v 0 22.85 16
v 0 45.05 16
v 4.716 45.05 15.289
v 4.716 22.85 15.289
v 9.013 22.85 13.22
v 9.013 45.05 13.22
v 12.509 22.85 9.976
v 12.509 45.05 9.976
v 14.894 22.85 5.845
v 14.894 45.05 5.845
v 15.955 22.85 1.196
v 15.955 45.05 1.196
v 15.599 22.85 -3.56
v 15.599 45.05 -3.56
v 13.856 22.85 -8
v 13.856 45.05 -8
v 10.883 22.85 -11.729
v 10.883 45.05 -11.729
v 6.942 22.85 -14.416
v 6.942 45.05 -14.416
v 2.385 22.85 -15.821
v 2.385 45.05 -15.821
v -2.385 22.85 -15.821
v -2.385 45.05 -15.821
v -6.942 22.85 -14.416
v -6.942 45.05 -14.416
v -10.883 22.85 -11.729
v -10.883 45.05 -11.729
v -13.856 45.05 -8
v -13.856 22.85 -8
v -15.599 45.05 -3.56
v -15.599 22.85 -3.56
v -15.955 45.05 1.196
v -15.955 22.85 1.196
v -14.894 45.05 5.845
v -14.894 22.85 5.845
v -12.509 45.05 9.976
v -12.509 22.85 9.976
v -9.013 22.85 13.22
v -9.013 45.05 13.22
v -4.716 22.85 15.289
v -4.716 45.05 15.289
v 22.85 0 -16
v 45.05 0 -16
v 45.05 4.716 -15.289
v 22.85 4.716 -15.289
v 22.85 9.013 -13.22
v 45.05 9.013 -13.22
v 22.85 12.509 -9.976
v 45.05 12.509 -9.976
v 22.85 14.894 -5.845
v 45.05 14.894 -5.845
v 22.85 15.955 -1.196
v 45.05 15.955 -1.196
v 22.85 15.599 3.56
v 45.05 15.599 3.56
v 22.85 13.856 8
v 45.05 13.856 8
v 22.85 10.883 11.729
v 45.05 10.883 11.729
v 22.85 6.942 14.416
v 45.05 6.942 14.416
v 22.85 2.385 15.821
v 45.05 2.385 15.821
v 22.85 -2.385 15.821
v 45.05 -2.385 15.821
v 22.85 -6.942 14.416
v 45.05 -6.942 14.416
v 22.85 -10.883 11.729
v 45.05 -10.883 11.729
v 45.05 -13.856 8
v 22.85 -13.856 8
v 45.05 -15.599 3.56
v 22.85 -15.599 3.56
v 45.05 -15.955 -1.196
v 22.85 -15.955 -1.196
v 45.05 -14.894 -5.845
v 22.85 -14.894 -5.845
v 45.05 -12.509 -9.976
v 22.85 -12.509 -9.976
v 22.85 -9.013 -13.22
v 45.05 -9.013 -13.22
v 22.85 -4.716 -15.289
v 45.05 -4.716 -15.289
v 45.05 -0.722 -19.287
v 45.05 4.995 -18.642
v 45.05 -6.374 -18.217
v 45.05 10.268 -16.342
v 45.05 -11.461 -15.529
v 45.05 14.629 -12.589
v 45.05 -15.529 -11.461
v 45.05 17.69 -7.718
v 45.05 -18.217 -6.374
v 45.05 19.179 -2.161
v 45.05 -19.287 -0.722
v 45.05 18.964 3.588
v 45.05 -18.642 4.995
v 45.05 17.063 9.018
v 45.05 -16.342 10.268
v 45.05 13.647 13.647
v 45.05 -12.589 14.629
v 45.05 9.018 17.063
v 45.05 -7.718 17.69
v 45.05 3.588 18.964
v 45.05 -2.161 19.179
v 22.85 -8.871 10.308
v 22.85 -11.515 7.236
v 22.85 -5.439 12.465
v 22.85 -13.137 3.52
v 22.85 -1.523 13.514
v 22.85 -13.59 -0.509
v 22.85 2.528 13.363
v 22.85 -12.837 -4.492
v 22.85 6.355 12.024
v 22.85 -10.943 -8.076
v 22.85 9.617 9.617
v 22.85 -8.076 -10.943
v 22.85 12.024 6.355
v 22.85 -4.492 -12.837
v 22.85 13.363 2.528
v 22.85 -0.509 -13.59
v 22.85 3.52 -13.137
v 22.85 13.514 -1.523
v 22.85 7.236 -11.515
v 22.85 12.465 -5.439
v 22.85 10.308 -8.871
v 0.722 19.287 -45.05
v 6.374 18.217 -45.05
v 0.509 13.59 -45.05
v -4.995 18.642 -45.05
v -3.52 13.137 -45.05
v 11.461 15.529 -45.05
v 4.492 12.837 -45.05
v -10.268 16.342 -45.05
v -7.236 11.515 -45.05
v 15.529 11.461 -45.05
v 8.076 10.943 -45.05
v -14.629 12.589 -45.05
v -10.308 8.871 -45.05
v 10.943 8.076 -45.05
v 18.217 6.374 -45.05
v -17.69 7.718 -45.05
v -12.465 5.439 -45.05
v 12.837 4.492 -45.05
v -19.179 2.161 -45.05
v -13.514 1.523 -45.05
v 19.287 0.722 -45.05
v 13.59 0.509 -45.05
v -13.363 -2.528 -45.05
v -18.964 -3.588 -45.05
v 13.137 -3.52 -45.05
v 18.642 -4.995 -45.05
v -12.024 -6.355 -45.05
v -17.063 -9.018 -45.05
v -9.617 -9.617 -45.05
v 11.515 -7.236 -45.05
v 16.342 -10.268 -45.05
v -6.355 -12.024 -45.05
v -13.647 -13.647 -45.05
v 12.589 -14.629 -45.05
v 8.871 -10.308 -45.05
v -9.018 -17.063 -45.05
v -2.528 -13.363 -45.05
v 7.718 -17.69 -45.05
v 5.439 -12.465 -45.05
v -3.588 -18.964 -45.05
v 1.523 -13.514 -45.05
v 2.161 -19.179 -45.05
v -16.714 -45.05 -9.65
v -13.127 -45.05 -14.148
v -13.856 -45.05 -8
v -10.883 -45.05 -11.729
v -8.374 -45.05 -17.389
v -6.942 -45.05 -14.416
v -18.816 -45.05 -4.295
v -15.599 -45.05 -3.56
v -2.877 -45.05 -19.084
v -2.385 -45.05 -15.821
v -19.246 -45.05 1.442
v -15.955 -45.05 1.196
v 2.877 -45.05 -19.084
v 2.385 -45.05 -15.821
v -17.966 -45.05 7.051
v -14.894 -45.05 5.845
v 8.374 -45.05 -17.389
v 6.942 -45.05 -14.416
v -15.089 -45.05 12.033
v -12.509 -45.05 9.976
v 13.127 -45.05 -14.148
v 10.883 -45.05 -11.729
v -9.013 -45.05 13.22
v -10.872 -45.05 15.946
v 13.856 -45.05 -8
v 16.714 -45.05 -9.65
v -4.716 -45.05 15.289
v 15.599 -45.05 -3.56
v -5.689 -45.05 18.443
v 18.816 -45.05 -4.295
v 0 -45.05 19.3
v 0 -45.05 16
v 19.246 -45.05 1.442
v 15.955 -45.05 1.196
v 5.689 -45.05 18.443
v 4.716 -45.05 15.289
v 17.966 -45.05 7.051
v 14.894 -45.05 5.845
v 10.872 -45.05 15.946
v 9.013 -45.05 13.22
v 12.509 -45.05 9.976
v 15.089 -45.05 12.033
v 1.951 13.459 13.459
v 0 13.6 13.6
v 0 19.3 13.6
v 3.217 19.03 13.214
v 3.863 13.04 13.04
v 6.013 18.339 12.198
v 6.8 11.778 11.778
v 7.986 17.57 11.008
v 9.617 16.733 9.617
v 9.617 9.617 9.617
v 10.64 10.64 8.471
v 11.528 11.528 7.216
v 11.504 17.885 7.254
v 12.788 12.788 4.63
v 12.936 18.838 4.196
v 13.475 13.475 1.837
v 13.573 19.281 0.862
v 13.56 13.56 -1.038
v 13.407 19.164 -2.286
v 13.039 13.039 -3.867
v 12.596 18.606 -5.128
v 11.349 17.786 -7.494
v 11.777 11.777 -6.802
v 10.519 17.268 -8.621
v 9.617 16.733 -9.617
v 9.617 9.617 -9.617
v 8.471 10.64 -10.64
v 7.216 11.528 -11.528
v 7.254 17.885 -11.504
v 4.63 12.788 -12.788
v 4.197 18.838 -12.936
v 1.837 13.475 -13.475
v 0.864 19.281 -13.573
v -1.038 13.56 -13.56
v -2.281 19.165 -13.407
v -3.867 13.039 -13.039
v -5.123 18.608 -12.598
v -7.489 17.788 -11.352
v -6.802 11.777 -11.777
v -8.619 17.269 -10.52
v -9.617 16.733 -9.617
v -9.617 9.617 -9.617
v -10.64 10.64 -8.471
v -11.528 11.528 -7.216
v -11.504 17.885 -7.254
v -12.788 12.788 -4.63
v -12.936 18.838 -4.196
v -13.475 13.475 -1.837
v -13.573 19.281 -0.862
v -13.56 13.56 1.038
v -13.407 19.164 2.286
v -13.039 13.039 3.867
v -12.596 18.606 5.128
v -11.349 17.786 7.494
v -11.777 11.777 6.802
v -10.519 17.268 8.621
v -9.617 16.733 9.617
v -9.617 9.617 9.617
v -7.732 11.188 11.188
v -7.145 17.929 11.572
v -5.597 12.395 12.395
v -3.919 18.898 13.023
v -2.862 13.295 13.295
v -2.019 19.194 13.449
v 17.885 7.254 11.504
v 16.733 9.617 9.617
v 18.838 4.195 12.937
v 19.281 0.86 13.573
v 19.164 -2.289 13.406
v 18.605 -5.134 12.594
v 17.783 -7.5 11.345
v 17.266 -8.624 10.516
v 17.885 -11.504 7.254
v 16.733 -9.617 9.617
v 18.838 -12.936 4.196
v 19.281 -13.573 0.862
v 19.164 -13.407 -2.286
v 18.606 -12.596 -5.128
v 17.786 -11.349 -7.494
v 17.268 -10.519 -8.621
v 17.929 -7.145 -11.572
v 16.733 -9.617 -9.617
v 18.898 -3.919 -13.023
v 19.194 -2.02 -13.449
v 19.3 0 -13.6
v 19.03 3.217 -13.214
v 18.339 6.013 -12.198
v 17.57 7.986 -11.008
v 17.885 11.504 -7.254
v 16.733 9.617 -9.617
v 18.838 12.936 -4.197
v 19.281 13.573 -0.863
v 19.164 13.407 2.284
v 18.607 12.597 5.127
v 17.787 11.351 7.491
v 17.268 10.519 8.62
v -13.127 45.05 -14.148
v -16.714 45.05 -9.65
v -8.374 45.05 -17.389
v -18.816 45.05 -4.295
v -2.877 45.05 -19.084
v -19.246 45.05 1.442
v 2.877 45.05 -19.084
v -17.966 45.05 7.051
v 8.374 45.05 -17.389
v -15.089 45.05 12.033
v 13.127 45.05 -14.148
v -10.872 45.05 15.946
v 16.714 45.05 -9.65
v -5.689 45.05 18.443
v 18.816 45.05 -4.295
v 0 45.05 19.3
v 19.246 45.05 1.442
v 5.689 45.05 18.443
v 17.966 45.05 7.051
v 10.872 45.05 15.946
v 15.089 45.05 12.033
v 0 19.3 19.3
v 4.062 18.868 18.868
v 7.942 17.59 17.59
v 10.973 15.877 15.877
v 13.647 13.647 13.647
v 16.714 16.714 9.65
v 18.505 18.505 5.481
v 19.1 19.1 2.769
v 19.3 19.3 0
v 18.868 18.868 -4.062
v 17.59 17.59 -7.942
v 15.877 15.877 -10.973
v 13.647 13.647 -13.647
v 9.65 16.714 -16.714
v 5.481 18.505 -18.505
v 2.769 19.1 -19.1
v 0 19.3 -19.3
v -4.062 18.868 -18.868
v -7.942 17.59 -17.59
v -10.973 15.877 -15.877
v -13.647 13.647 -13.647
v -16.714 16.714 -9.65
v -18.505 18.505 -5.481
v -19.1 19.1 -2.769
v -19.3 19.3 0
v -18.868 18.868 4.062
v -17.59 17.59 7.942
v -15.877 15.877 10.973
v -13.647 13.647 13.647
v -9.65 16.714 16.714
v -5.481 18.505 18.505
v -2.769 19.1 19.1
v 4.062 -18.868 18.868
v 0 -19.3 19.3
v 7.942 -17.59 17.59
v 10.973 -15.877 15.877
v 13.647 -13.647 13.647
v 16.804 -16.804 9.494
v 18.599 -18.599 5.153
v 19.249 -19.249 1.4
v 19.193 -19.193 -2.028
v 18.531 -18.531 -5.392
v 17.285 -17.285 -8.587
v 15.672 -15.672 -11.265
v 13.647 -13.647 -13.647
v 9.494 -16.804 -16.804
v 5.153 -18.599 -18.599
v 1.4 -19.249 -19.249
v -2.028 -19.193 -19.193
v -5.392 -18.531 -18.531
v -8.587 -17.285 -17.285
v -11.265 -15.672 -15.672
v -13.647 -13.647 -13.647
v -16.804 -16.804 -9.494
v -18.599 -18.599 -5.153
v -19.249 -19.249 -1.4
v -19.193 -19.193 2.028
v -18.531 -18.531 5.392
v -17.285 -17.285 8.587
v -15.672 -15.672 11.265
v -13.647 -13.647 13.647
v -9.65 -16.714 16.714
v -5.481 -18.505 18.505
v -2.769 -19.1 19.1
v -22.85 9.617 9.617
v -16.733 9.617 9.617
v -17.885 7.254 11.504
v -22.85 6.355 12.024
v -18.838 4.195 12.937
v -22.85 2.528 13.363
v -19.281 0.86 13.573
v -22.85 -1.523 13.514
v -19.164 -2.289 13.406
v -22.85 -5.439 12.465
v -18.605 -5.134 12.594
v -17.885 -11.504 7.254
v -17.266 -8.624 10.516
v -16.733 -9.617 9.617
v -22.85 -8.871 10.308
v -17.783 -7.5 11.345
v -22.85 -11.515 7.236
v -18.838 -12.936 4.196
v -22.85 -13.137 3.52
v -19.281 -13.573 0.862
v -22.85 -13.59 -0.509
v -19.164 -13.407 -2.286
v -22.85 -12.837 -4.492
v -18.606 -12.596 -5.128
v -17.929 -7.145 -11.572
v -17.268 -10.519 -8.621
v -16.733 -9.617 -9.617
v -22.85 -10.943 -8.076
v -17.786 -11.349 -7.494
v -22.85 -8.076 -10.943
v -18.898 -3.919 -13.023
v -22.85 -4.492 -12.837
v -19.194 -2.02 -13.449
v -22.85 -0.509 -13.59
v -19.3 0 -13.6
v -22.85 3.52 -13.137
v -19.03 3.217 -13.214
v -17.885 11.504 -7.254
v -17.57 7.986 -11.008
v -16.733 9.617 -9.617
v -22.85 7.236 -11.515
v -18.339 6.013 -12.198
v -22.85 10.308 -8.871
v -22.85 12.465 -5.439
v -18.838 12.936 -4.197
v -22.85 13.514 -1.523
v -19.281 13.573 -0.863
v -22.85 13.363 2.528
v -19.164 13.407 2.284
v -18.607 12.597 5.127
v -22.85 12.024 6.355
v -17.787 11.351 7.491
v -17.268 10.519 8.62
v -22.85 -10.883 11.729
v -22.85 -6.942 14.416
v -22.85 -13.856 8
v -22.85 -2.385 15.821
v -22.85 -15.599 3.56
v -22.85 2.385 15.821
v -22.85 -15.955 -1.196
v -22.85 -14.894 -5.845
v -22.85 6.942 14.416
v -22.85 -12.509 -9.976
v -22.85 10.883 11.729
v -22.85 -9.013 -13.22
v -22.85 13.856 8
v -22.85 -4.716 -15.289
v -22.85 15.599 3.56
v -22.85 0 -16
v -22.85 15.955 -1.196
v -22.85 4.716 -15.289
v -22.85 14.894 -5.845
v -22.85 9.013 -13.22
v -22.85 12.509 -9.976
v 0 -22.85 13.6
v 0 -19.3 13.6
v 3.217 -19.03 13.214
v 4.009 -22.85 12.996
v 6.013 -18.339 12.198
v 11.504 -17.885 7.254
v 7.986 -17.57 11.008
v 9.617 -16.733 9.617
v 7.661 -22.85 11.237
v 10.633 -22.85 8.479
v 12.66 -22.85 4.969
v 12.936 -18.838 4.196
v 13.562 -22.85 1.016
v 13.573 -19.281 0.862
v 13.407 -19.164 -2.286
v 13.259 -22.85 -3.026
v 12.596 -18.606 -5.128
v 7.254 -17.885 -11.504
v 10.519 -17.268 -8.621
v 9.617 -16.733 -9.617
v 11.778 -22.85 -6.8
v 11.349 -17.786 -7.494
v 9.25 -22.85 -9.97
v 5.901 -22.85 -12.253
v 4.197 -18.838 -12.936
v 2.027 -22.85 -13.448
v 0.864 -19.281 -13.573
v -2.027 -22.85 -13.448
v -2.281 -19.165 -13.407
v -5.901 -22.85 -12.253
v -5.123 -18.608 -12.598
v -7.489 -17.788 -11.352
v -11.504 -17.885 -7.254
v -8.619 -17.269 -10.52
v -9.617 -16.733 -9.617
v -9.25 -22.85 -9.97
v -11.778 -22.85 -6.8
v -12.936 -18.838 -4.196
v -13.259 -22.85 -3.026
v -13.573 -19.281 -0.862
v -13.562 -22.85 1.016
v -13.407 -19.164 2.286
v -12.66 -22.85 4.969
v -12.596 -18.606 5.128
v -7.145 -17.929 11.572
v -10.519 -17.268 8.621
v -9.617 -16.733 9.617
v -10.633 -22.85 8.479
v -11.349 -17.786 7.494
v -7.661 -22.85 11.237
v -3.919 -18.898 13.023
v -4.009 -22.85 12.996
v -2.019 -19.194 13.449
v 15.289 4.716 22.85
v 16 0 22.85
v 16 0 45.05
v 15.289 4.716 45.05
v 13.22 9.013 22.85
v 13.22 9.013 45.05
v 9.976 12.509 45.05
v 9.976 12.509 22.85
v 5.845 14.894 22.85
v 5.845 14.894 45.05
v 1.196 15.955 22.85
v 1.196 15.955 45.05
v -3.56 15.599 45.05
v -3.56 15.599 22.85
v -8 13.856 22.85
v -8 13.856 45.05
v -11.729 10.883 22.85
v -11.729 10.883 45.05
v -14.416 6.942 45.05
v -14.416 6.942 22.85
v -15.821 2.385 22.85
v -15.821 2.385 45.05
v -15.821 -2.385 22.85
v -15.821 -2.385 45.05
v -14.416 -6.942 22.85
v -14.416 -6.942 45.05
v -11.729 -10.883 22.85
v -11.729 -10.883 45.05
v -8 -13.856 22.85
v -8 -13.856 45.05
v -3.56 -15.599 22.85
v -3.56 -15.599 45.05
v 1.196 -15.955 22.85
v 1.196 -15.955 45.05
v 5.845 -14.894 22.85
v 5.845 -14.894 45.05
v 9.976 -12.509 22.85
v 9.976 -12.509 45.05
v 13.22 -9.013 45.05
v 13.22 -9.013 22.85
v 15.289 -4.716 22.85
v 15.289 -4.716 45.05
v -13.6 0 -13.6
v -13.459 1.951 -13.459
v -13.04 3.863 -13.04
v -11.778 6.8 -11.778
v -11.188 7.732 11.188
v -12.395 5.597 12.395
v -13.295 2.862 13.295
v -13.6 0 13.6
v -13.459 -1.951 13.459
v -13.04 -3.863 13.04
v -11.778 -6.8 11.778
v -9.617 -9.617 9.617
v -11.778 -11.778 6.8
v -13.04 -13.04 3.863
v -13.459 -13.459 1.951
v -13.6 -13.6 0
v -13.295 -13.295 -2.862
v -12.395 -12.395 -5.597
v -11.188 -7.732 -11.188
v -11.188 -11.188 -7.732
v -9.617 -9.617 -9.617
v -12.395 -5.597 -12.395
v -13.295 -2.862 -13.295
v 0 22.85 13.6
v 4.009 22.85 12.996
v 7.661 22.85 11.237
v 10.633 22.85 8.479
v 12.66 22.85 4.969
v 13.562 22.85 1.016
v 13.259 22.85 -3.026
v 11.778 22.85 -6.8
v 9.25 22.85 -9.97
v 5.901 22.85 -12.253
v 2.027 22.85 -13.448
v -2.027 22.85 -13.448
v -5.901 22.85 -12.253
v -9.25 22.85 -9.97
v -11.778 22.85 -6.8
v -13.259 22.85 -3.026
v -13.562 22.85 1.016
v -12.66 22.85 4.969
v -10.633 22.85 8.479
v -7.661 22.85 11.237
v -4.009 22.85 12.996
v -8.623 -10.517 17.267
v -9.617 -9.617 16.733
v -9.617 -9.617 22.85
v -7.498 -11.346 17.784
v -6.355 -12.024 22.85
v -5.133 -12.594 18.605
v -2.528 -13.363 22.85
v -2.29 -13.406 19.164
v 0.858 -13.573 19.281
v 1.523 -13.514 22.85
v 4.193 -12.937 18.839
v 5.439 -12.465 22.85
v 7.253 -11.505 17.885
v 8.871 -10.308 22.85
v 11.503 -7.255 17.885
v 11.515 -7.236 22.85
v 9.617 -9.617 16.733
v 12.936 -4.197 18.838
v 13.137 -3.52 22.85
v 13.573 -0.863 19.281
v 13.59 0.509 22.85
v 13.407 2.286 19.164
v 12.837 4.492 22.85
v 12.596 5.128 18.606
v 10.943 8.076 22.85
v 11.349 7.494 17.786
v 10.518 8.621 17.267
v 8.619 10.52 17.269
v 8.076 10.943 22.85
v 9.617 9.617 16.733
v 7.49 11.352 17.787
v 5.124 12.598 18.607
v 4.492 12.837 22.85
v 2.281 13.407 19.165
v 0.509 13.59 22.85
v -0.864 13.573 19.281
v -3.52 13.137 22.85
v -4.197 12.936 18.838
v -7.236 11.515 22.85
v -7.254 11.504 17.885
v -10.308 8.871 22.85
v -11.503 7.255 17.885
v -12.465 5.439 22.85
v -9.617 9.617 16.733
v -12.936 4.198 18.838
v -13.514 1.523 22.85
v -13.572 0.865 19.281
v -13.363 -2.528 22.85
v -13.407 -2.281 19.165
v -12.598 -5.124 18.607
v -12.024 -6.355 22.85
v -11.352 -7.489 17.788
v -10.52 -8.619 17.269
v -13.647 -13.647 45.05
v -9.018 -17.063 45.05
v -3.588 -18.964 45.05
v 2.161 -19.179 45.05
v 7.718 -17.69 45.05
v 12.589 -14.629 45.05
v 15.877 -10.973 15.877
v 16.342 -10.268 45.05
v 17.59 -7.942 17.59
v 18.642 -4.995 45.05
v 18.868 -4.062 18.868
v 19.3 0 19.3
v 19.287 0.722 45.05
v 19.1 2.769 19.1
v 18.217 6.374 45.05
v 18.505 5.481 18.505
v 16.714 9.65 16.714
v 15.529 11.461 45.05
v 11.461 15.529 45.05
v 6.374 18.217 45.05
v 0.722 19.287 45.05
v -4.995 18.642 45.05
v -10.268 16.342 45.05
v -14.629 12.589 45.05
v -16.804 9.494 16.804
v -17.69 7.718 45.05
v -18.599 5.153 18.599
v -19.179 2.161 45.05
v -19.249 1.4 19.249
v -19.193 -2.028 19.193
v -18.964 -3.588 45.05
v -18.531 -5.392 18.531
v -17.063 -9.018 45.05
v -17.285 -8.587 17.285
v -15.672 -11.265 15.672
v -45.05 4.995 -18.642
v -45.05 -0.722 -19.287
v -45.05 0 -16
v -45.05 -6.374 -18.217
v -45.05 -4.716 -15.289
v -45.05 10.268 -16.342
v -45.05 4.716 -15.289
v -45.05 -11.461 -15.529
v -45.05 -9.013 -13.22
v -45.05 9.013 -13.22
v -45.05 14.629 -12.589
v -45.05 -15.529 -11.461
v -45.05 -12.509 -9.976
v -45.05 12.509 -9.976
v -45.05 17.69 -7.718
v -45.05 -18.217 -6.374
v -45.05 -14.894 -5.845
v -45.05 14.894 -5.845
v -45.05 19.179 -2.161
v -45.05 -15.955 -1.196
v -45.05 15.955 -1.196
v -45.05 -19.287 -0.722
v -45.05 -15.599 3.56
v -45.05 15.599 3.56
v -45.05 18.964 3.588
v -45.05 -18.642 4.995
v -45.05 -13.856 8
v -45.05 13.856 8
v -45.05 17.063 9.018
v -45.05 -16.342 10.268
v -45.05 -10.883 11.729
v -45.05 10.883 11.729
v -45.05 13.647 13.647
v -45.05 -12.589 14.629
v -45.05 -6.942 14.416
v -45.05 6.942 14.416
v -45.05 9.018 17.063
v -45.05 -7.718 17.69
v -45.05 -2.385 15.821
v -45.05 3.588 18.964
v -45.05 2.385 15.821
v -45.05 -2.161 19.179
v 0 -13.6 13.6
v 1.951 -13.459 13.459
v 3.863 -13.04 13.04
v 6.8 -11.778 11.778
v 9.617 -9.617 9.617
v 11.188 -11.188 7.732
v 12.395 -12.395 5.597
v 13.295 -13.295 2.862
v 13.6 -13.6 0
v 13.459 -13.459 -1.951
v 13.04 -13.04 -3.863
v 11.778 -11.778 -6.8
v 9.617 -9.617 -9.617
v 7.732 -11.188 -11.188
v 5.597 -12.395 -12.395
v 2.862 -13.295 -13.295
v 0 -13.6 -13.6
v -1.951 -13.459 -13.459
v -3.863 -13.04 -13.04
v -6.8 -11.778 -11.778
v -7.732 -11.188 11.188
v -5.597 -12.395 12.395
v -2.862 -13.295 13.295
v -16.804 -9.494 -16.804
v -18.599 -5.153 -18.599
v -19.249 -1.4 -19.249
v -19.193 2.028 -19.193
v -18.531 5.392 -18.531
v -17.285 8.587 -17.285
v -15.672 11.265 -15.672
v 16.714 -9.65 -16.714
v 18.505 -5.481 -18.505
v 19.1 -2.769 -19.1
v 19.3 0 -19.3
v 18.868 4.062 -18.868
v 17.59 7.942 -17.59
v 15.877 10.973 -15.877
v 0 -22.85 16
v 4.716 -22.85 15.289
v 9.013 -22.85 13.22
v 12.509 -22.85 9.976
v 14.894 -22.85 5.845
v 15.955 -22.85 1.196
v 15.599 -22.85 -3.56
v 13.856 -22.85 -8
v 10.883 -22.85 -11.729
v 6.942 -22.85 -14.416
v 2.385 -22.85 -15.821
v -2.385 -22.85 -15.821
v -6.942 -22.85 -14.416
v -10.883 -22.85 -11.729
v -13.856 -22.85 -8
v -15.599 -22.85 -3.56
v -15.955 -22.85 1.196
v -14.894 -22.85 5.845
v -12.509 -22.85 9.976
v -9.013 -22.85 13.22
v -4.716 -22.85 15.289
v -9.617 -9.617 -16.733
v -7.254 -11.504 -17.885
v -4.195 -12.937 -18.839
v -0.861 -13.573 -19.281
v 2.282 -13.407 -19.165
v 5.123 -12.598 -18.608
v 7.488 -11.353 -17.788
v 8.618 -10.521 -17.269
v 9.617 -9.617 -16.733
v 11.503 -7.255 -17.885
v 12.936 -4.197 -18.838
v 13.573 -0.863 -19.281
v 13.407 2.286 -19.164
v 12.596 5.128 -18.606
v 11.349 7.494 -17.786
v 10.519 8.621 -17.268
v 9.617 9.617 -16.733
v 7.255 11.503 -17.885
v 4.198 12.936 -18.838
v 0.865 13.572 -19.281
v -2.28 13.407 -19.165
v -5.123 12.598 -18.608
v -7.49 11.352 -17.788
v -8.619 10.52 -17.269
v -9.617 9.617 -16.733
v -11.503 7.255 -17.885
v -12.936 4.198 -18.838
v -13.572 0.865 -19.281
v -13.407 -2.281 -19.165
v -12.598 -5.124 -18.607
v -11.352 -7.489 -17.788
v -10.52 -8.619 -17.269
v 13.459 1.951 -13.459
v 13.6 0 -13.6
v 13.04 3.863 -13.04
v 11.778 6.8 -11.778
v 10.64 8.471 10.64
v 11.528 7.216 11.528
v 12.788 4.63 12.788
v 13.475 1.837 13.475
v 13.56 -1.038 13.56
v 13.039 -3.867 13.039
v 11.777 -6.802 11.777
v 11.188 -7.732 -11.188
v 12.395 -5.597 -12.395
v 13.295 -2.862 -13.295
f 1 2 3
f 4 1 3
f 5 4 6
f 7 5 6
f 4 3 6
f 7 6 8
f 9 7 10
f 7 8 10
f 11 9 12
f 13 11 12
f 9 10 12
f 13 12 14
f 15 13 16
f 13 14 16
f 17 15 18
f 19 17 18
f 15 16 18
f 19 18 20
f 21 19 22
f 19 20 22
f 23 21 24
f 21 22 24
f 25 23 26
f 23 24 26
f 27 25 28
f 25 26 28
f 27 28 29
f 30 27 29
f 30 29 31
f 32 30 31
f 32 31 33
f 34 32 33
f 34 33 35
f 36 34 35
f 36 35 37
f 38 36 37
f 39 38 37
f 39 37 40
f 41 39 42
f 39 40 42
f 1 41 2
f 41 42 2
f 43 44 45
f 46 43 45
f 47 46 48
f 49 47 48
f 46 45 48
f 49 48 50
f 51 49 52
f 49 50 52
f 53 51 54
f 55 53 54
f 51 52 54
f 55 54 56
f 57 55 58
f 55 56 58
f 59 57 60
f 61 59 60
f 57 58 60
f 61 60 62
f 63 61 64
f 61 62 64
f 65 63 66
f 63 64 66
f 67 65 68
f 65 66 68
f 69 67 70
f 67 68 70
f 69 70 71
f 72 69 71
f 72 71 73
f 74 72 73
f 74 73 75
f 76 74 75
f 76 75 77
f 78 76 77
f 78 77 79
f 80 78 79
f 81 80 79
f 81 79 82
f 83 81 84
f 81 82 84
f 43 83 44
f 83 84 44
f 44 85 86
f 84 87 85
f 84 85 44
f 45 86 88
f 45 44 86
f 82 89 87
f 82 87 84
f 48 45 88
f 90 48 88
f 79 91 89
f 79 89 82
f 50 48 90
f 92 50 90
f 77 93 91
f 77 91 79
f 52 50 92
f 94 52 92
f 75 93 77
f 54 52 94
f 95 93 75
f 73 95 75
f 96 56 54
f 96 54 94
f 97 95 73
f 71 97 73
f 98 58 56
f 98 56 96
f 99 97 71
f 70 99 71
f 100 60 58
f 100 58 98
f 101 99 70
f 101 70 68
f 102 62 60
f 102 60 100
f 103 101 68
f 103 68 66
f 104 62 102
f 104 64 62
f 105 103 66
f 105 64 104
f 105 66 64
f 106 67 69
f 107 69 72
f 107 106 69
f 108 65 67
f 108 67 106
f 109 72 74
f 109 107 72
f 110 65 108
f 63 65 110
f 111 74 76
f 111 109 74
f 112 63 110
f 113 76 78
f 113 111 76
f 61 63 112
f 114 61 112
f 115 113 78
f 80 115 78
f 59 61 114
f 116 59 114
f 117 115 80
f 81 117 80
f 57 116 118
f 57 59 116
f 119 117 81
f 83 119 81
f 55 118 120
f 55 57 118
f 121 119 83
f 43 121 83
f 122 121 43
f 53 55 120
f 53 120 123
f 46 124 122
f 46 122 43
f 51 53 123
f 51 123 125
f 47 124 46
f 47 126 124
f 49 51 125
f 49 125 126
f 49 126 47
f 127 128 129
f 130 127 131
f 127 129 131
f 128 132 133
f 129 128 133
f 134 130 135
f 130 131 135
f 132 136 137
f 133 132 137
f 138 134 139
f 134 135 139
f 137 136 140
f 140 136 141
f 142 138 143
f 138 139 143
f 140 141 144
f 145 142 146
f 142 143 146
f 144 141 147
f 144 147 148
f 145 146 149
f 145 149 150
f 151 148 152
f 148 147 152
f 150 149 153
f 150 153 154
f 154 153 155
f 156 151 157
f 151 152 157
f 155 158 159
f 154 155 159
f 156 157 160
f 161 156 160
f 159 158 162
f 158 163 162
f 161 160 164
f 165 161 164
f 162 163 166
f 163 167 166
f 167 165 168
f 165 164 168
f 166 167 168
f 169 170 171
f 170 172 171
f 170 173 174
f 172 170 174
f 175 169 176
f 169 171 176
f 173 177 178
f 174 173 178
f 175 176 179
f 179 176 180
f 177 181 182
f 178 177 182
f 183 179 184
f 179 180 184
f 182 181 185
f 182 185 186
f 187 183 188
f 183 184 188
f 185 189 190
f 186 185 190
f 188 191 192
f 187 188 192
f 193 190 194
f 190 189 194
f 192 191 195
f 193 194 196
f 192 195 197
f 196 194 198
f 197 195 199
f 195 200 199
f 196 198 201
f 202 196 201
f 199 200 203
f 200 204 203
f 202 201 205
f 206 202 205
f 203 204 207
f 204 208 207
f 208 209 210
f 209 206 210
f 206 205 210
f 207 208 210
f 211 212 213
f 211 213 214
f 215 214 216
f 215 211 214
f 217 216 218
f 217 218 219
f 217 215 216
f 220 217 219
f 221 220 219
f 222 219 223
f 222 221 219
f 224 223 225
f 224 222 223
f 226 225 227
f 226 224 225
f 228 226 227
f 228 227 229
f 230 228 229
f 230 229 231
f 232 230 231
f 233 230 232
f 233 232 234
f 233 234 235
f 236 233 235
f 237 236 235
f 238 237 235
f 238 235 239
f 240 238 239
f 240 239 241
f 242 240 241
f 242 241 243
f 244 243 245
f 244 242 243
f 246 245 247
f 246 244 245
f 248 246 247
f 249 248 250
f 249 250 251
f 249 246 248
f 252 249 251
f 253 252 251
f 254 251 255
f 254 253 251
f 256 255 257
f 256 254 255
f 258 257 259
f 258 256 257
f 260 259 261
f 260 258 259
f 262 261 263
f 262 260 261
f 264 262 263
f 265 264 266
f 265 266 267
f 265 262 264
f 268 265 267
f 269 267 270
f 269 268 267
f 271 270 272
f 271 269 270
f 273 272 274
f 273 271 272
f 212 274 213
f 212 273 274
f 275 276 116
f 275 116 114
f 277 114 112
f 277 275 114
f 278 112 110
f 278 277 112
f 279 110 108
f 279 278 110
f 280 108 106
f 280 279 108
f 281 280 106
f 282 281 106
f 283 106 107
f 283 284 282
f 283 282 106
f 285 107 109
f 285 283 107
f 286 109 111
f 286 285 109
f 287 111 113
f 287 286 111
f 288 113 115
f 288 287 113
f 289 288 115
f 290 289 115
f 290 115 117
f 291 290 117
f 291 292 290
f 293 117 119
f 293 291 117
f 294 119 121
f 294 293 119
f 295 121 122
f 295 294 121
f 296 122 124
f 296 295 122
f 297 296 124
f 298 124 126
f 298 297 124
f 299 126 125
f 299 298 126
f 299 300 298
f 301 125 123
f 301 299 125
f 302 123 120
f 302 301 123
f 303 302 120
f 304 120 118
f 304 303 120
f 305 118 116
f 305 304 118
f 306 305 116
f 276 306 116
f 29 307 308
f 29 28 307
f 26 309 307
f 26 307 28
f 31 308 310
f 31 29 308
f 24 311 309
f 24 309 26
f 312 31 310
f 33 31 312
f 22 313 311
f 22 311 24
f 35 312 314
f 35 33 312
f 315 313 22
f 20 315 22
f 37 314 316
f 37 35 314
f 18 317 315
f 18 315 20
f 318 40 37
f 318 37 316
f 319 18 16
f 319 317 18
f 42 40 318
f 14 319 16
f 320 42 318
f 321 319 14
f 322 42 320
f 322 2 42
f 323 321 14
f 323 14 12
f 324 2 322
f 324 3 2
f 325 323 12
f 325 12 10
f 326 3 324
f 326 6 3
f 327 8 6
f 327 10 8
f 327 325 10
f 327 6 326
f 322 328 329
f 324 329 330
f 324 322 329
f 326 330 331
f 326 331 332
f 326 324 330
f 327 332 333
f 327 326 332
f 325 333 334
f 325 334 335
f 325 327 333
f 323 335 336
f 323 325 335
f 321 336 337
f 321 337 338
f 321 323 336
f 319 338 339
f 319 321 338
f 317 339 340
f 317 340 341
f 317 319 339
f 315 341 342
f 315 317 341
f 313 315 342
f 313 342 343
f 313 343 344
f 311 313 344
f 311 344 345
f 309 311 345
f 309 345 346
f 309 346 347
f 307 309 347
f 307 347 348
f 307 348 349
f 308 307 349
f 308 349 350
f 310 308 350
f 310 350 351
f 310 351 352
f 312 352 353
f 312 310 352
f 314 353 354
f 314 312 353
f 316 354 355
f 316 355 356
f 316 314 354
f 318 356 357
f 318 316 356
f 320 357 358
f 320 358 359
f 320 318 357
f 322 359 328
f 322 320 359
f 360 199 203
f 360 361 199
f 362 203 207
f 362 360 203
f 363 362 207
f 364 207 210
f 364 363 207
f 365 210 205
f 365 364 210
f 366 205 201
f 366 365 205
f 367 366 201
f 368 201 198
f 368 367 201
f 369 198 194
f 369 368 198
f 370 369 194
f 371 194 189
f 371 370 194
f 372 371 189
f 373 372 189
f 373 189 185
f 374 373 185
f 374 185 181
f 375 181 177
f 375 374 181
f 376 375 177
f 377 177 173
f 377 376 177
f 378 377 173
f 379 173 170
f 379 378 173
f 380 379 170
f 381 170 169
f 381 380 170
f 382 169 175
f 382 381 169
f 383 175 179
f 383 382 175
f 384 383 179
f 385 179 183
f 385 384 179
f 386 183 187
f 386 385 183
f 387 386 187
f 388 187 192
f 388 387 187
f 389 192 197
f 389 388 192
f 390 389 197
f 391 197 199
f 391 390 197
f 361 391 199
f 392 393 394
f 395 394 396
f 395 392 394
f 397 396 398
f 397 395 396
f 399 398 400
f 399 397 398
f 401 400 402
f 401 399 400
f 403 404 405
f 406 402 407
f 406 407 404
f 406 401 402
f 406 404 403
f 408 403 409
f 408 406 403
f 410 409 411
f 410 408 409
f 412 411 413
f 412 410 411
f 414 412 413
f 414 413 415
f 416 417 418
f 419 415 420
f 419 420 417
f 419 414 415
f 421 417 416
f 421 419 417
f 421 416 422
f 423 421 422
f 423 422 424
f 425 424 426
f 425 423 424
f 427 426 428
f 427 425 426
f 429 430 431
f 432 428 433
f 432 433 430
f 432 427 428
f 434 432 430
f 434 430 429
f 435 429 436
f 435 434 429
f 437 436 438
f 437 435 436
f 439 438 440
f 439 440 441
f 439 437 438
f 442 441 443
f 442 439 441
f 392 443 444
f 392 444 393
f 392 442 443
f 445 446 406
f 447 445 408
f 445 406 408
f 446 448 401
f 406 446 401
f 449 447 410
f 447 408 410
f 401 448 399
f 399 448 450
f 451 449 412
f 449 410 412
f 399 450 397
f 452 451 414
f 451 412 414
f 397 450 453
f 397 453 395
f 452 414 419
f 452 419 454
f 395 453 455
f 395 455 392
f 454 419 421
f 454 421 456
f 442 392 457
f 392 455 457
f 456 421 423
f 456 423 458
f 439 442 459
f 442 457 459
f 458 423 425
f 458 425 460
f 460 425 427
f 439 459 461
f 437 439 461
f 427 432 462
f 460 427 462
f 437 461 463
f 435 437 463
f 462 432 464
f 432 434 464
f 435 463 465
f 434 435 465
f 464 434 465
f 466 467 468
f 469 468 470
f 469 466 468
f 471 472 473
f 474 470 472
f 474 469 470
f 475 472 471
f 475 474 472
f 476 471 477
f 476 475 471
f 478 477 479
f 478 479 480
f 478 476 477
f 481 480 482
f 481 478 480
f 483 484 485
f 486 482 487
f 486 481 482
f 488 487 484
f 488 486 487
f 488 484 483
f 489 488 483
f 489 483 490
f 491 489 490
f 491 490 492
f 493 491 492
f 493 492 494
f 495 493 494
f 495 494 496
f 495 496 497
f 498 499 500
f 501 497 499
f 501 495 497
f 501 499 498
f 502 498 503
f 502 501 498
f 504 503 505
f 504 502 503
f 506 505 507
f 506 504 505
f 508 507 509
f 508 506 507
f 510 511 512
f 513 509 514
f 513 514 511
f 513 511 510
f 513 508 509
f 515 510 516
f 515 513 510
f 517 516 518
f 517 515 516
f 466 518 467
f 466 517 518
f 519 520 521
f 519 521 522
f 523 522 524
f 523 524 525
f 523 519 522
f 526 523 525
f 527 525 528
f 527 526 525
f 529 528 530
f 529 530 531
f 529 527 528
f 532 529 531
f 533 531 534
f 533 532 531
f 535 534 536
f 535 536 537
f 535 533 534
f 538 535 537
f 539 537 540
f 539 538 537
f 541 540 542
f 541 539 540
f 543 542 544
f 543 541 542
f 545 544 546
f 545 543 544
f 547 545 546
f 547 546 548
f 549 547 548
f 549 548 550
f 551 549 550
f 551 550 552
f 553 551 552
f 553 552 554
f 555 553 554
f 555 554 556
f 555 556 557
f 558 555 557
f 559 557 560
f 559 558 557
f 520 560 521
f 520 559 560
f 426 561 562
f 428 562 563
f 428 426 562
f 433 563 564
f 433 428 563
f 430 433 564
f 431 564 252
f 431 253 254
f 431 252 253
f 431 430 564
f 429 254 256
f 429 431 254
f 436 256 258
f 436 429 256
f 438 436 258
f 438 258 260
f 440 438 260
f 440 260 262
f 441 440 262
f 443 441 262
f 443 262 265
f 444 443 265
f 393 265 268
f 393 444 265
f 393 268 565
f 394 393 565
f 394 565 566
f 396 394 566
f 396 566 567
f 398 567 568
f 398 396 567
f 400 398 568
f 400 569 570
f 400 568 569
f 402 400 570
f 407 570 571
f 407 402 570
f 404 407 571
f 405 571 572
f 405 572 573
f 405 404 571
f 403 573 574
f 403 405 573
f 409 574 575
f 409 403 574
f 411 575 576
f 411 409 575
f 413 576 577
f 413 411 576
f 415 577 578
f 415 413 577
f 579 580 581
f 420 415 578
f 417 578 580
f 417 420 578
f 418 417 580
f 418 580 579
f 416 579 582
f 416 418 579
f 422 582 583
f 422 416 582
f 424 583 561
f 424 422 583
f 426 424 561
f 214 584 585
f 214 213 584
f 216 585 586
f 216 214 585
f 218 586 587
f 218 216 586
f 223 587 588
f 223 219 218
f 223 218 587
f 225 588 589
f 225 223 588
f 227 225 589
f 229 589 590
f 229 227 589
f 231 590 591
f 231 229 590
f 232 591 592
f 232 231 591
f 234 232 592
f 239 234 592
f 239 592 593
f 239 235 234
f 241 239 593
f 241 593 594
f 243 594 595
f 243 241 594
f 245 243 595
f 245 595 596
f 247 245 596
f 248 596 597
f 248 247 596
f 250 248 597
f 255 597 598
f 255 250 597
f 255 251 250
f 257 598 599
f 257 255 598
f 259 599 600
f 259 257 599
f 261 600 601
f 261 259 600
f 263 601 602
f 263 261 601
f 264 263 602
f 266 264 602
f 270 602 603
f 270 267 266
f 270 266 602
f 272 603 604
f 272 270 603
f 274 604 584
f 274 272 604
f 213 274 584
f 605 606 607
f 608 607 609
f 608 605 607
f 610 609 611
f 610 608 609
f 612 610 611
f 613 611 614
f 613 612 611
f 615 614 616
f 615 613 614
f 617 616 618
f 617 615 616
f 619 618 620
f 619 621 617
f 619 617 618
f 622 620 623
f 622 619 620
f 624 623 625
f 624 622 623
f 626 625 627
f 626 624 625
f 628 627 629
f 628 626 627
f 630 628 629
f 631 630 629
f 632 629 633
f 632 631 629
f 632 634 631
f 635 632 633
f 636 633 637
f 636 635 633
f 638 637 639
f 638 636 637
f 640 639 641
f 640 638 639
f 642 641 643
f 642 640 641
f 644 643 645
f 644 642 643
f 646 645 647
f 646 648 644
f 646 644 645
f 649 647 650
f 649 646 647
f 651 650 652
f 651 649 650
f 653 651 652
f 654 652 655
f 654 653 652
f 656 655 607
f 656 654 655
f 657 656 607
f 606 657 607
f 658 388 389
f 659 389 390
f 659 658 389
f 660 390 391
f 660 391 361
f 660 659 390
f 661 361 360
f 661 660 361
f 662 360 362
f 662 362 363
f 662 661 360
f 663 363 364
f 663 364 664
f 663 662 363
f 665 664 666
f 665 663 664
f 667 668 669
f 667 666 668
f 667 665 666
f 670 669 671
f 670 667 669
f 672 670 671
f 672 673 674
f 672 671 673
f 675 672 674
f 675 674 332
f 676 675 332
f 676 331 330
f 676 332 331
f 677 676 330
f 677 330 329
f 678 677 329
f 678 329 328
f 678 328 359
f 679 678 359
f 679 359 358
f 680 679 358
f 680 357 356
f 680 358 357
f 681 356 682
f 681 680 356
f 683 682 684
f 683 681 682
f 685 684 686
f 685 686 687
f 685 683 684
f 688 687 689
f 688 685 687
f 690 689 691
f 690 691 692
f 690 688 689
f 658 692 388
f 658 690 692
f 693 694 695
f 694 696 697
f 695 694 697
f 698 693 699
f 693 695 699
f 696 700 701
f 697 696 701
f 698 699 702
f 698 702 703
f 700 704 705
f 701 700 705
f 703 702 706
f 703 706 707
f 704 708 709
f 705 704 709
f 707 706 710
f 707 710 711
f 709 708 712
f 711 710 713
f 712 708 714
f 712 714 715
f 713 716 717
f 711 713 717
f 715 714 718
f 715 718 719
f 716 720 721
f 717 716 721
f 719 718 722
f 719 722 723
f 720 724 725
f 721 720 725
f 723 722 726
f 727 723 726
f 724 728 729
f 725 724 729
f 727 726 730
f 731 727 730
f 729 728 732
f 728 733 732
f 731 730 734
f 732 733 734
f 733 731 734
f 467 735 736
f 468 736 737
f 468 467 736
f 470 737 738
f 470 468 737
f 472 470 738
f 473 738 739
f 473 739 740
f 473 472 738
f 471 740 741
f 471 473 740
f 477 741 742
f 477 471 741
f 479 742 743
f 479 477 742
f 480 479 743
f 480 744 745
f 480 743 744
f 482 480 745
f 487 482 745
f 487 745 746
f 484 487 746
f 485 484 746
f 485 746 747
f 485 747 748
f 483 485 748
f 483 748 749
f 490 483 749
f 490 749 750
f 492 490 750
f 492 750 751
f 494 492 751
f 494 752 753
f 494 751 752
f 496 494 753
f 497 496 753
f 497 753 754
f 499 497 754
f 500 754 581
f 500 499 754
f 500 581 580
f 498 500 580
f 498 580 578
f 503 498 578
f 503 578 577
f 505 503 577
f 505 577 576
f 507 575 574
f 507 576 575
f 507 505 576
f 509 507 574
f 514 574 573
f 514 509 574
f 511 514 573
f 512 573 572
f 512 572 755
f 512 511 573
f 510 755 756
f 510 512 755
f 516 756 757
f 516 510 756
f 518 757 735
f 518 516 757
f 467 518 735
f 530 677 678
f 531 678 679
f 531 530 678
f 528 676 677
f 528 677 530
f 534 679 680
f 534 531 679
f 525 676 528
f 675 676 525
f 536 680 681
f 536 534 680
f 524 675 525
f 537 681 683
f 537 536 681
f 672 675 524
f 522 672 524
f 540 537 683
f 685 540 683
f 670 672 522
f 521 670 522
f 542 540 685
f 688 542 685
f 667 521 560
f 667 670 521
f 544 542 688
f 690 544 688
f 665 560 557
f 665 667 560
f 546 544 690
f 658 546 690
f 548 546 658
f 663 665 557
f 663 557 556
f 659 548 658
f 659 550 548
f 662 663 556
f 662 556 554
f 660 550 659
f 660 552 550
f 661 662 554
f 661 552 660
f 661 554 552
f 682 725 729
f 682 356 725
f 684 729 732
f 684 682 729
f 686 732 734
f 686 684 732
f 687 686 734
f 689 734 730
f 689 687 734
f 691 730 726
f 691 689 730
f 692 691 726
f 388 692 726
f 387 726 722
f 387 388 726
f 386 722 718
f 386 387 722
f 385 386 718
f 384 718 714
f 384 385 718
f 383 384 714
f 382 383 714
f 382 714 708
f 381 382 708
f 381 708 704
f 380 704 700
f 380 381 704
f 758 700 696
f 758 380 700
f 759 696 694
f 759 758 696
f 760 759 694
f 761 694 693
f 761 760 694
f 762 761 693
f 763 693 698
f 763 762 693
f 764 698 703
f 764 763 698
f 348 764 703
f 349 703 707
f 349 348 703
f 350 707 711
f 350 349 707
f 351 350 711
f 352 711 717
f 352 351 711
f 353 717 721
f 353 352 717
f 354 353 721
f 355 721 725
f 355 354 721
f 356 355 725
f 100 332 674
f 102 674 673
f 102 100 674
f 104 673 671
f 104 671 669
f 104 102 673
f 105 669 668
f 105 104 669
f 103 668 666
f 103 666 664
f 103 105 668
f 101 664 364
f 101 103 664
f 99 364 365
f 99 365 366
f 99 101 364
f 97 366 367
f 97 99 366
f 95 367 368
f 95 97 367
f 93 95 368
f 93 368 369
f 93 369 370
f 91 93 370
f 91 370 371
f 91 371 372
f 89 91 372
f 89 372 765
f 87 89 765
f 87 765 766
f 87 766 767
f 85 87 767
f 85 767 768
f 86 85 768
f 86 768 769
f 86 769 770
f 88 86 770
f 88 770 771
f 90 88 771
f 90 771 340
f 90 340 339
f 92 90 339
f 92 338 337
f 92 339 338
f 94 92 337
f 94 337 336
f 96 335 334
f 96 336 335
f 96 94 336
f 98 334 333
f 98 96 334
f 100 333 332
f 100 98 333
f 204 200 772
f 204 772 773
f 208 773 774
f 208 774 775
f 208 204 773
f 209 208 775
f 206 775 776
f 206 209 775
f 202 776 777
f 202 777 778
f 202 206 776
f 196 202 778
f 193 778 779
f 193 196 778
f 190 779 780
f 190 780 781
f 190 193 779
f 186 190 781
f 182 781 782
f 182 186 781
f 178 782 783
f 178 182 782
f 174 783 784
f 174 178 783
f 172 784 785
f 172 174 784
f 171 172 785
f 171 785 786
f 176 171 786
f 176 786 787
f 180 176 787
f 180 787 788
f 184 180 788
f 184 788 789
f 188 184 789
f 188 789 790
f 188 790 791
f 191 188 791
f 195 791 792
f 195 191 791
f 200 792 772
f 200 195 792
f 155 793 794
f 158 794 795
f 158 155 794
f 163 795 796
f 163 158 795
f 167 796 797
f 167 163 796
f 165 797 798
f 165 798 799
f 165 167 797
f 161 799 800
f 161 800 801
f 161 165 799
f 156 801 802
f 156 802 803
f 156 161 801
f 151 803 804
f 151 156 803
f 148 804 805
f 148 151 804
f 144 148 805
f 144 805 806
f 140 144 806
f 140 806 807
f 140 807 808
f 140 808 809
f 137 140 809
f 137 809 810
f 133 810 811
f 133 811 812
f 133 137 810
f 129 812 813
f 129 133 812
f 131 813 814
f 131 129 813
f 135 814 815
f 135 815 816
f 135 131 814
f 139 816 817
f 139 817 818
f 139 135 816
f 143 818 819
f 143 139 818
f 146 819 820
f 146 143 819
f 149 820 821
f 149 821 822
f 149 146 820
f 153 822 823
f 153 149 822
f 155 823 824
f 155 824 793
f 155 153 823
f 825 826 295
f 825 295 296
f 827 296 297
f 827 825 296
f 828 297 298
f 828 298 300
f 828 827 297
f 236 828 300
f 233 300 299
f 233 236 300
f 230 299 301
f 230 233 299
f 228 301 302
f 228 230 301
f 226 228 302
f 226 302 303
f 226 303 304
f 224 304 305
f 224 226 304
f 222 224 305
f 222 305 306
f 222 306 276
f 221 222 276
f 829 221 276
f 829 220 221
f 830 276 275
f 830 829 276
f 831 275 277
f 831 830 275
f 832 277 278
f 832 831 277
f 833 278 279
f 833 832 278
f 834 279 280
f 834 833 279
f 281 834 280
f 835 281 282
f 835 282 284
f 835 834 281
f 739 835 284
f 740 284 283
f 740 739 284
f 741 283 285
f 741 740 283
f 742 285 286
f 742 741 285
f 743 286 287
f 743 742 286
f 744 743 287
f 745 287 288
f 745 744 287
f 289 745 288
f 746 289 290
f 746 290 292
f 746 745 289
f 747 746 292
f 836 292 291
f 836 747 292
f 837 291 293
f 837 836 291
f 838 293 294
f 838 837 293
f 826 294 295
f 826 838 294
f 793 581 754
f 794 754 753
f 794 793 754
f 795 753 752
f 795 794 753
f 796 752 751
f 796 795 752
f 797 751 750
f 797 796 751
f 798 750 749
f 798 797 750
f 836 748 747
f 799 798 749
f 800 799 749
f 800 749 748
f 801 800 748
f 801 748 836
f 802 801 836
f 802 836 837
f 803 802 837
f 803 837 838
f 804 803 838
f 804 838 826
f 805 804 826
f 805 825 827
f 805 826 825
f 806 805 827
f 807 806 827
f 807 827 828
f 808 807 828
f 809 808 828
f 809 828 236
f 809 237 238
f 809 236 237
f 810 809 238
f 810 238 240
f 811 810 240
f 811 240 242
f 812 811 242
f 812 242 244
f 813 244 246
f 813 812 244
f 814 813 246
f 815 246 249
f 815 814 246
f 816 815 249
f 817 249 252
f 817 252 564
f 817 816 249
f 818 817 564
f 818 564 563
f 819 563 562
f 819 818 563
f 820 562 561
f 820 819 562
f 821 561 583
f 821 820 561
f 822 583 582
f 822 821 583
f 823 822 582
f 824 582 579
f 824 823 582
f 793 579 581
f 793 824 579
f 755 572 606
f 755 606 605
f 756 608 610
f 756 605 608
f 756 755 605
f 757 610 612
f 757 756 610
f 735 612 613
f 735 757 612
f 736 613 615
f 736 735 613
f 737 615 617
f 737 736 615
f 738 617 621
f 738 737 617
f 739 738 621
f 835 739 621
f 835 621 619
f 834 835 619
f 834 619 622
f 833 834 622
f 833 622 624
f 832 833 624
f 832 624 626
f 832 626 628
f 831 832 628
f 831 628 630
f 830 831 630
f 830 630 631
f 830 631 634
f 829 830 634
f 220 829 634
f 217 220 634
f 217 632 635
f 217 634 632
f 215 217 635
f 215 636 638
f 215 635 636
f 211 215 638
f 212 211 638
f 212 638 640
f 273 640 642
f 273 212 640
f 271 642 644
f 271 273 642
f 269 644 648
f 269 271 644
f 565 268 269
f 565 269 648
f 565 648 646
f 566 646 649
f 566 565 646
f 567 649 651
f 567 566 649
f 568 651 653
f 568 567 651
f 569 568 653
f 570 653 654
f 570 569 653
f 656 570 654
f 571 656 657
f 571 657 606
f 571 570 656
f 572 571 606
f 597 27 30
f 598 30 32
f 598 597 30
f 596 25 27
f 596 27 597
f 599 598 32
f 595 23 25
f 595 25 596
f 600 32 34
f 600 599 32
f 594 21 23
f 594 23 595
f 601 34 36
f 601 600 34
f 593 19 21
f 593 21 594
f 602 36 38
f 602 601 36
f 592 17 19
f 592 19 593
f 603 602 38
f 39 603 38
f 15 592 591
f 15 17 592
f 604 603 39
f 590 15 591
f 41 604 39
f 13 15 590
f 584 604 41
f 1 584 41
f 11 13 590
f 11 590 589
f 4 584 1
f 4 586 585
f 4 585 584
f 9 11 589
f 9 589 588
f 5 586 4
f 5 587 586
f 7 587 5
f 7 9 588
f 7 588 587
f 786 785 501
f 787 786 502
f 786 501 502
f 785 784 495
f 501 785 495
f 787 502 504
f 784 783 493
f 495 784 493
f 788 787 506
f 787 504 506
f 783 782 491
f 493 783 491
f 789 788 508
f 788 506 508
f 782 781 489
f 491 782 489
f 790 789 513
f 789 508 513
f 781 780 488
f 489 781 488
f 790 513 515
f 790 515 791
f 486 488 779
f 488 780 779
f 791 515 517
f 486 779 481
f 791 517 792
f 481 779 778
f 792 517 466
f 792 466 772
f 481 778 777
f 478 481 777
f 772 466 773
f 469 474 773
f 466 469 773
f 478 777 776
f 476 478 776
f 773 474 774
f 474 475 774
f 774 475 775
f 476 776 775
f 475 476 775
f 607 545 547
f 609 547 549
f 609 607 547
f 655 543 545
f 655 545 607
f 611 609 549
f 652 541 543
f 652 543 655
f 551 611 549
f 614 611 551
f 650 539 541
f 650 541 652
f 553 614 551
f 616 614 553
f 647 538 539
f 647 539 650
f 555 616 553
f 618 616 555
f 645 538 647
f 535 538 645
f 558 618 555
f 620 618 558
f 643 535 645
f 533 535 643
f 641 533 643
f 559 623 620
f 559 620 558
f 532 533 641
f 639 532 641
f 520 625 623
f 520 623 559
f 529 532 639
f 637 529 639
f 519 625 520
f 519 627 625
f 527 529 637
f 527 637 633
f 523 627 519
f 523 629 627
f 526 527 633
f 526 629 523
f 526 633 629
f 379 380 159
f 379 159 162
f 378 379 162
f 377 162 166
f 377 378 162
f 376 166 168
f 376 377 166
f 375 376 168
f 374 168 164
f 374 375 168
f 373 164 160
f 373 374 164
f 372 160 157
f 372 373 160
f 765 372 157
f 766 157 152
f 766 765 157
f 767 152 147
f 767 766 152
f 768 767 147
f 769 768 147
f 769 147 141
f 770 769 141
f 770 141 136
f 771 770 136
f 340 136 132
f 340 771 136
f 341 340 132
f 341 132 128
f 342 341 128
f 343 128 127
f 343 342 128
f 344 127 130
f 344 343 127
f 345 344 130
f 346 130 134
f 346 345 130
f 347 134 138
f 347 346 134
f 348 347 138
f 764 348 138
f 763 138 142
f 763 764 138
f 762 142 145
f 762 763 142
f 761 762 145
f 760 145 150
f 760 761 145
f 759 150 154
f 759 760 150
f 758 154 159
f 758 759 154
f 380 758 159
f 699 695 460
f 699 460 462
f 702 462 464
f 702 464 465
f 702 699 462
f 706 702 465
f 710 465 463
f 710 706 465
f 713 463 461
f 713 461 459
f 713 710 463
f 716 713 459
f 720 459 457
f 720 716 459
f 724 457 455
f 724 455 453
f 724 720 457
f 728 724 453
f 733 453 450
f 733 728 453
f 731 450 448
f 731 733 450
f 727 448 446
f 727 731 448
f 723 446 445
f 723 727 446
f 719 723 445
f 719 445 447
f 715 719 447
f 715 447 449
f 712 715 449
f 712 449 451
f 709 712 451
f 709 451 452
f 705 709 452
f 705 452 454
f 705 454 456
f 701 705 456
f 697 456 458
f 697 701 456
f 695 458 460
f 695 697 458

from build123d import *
from OCP.BRepAlgoAPI import BRepAlgoAPI_Cut
from OCP.TopTools import TopTools_ListOfShape
from build123d.topology import SkipClean

# Parameters (mm, degrees)
SKETCH_1_R                = 19.3
SKETCH_1_R_2              = 13.6
EXTRUDE_1_DEPTH           = 45.05
SKETCH_3_R                = 19.3
SKETCH_3_R_2              = 13.6
EXTRUDE_3_DEPTH           = 45.05
SKETCH_2_R                = 19.3
SKETCH_2_R_2              = 13.6
EXTRUDE_2_DEPTH           = 45.05
CUT_EXTRUDE_1_DEPTH       = 79.028889054
CUT_EXTRUDE_1_DEPTH_BACK  = 79.028889054
SKETCH_1_13_R             = 13.6
CUT_EXTRUDE_START         = -45.0500001
CUT_EXTRUDE_2_OUTLINE_R   = 13.6
CUT_EXTRUDE_2_DEPTH       = 90.1000002
CUT_EXTRUDE_3_DEPTH       = 79.028889054
CUT_EXTRUDE_3_DEPTH_BACK  = 124.078889054
CUT_EXTRUDE_3_START       = 45.05
SKETCH_2_8_R              = 13.6
CUT_EXTRUDE_START_2       = -45.05
SKETCH_1_15_R             = 16
CUT_EXTRUDE_4_DEPTH       = 22.2
CUT_EXTRUDE_START_3       = 45.05
SKETCH_1_16_R             = 16
CUT_EXTRUDE_5_DEPTH       = 22.2
SKETCH_3_9_R              = 16
CUT_EXTRUDE_6_DEPTH       = 22.2
SKETCH_3_10_R             = 16
CUT_EXTRUDE_7_DEPTH       = 22.2
CUT_EXTRUDE_START_4       = 22.85
CUT_EXTRUDE_8_OUTLINE_R   = 16
CUT_EXTRUDE_8_OUTLINE_R_2 = 13.6
CUT_EXTRUDE_8_DEPTH       = 22.2


with BuildPart() as part:
    # 草图1 → 凸台-拉伸1 (new, symmetric)
    with BuildSketch(Plane(origin=(0, 0, 0), x_dir=(1, 0, 0), z_dir=(0, 1, 0))):
        with Locations(Location((0, 0, 0), (0, 0, 270))):
            Circle(SKETCH_1_R)
        with Locations(Location((0, 0, 0), (0, 0, 270))):
            Circle(SKETCH_1_R_2, mode=Mode.SUBTRACT)
    extrude(amount=EXTRUDE_1_DEPTH, both=True)

    # 草图3 → 凸台-拉伸3 (add, symmetric)
    with BuildSketch(Plane(origin=(0, 0, 0), x_dir=(0, 0, -1), z_dir=(1, 0, 0))):
        with Locations(Location((0, 0, 0), (0, 0, 135))):
            Circle(SKETCH_3_R)
        with Locations(Location((0, 0, 0), (0, 0, 135.000001563))):
            Circle(SKETCH_3_R_2, mode=Mode.SUBTRACT)
    extrude(amount=EXTRUDE_3_DEPTH, both=True)

    # 草图2 → 凸台-拉伸2 (add, symmetric)
    with BuildSketch(Plane.XY):
        with Locations(Location((0, 0, 0), (0, 0, 225))):
            Circle(SKETCH_2_R)
        with Locations(Location((0, 0, 0), (0, 0, 224.999996387))):
            Circle(SKETCH_2_R_2, mode=Mode.SUBTRACT)
    extrude(amount=EXTRUDE_2_DEPTH, both=True)

    # 草图1<13> → 切除-拉伸1 (cut, two sides: drawn at the far end of the back side and taken through both)
    with BuildSketch(Plane(origin=(0, 0, 0), x_dir=(1, 0, 0), z_dir=(0, 1, 0)).offset(-CUT_EXTRUDE_1_DEPTH_BACK)):
        with Locations(Location((0, 0, 0), (0, 0, 270))):
            Circle(SKETCH_1_13_R)
    extrude(amount=CUT_EXTRUDE_1_DEPTH + CUT_EXTRUDE_1_DEPTH_BACK, mode=Mode.SUBTRACT)

    # 切除-拉伸2: read off the stored shape, not the designer's step
    # 切除-拉伸2 outline → 切除-拉伸2 (cut)
    with BuildSketch(Plane(origin=(0, 0, 0), x_dir=(0, 0, -1), z_dir=(1, 0, 0)).offset(CUT_EXTRUDE_START)):
        Circle(CUT_EXTRUDE_2_OUTLINE_R)
    extrude(amount=CUT_EXTRUDE_2_DEPTH, mode=Mode.SUBTRACT)

    # 草图2<8> → 切除-拉伸3 (cut, two sides: drawn at the far end of the back side and taken through both)
    with BuildSketch(Plane.XY.offset(CUT_EXTRUDE_3_START - CUT_EXTRUDE_3_DEPTH_BACK)):
        with Locations(Location((0, 0, 0), (0, 0, 225))):
            Circle(SKETCH_2_8_R)
    extrude(amount=CUT_EXTRUDE_3_DEPTH + CUT_EXTRUDE_3_DEPTH_BACK, mode=Mode.SUBTRACT)


with BuildPart() as cut_extrude_3_kept_piece:
    # of the separate pieces the step leaves, the one the design keeps (cut_extrude_3_pieces_kept)
    add(part.part.solids().sort_by_distance((0, -45.05, 19.3))[0])

    # 草图1<15> → 切除-拉伸4 (cut)
    with SkipClean():  # the faces are left unmerged after this step: merging them gives an invalid solid
        with BuildSketch(Plane(origin=(0, 0, 0), x_dir=(1, 0, 0), z_dir=(0, 1, 0)).offset(CUT_EXTRUDE_START_2)):
            with Locations(Location((0, 0, 0), (0, 0, 270))):
                Circle(SKETCH_1_15_R)
        extrude(amount=CUT_EXTRUDE_4_DEPTH, mode=Mode.SUBTRACT)

    # 草图1<16> → 切除-拉伸5 (cut)
    with SkipClean():  # the faces are left unmerged after this step: merging them gives an invalid solid
        with BuildSketch(Plane(origin=(0, 0, 0), x_dir=(1, 0, 0), z_dir=(0, 1, 0)).offset(CUT_EXTRUDE_START_3)):
            with Locations(Location((0, 0, 0), (0, 0, 270))):
                Circle(SKETCH_1_16_R)
        extrude(amount=-CUT_EXTRUDE_5_DEPTH, mode=Mode.SUBTRACT)

    # 草图3<9> → 切除-拉伸6 (cut)
    with SkipClean():  # the faces are left unmerged after this step: merging them gives an invalid solid
        with BuildSketch(Plane(origin=(0, 0, 0), x_dir=(0, 0, -1), z_dir=(1, 0, 0)).offset(CUT_EXTRUDE_START_2)):
            Circle(SKETCH_3_9_R)
        extrude(amount=CUT_EXTRUDE_6_DEPTH, mode=Mode.SUBTRACT)

    # 草图3<10> → 切除-拉伸7 (cut)
    with SkipClean():  # the faces are left unmerged after this step: merging them gives an invalid solid
        with BuildSketch(Plane(origin=(0, 0, 0), x_dir=(0, 0, -1), z_dir=(1, 0, 0)).offset(CUT_EXTRUDE_START_3)):
            Circle(SKETCH_3_10_R)
        extrude(amount=-CUT_EXTRUDE_7_DEPTH, mode=Mode.SUBTRACT)


with BuildPart() as cut_extrude_8_tool:
    # 切除-拉伸8: read off the stored shape, not the designer's step
    # 切除-拉伸8 outline → 切除-拉伸8 (new body)
    with BuildSketch(Plane.XY.offset(CUT_EXTRUDE_START_4)):
        Circle(CUT_EXTRUDE_8_OUTLINE_R)
        Circle(CUT_EXTRUDE_8_OUTLINE_R_2, mode=Mode.SUBTRACT)
    extrude(amount=CUT_EXTRUDE_8_DEPTH)


with BuildPart() as cut_extrude_3_kept_piece_1:
    add(cut_extrude_3_kept_piece.part)

    # 切除-拉伸8: cut by cut_extrude_8_tool, with a tolerance
    cut_extrude_8_stock = TopTools_ListOfShape()
    cut_extrude_8_stock.Append(cut_extrude_3_kept_piece_1.part.wrapped)
    cut_extrude_8_tools = TopTools_ListOfShape()
    cut_extrude_8_tools.Append(cut_extrude_8_tool.part.wrapped)
    cut_extrude_8_cut = BRepAlgoAPI_Cut()
    cut_extrude_8_cut.SetArguments(cut_extrude_8_stock)
    cut_extrude_8_cut.SetTools(cut_extrude_8_tools)
    cut_extrude_8_cut.SetFuzzyValue(0.00001)
    cut_extrude_8_cut.Build()
    add(Compound.cast(cut_extrude_8_cut.Shape()).solids(), mode=Mode.REPLACE)


solid = cut_extrude_3_kept_piece_1.part
